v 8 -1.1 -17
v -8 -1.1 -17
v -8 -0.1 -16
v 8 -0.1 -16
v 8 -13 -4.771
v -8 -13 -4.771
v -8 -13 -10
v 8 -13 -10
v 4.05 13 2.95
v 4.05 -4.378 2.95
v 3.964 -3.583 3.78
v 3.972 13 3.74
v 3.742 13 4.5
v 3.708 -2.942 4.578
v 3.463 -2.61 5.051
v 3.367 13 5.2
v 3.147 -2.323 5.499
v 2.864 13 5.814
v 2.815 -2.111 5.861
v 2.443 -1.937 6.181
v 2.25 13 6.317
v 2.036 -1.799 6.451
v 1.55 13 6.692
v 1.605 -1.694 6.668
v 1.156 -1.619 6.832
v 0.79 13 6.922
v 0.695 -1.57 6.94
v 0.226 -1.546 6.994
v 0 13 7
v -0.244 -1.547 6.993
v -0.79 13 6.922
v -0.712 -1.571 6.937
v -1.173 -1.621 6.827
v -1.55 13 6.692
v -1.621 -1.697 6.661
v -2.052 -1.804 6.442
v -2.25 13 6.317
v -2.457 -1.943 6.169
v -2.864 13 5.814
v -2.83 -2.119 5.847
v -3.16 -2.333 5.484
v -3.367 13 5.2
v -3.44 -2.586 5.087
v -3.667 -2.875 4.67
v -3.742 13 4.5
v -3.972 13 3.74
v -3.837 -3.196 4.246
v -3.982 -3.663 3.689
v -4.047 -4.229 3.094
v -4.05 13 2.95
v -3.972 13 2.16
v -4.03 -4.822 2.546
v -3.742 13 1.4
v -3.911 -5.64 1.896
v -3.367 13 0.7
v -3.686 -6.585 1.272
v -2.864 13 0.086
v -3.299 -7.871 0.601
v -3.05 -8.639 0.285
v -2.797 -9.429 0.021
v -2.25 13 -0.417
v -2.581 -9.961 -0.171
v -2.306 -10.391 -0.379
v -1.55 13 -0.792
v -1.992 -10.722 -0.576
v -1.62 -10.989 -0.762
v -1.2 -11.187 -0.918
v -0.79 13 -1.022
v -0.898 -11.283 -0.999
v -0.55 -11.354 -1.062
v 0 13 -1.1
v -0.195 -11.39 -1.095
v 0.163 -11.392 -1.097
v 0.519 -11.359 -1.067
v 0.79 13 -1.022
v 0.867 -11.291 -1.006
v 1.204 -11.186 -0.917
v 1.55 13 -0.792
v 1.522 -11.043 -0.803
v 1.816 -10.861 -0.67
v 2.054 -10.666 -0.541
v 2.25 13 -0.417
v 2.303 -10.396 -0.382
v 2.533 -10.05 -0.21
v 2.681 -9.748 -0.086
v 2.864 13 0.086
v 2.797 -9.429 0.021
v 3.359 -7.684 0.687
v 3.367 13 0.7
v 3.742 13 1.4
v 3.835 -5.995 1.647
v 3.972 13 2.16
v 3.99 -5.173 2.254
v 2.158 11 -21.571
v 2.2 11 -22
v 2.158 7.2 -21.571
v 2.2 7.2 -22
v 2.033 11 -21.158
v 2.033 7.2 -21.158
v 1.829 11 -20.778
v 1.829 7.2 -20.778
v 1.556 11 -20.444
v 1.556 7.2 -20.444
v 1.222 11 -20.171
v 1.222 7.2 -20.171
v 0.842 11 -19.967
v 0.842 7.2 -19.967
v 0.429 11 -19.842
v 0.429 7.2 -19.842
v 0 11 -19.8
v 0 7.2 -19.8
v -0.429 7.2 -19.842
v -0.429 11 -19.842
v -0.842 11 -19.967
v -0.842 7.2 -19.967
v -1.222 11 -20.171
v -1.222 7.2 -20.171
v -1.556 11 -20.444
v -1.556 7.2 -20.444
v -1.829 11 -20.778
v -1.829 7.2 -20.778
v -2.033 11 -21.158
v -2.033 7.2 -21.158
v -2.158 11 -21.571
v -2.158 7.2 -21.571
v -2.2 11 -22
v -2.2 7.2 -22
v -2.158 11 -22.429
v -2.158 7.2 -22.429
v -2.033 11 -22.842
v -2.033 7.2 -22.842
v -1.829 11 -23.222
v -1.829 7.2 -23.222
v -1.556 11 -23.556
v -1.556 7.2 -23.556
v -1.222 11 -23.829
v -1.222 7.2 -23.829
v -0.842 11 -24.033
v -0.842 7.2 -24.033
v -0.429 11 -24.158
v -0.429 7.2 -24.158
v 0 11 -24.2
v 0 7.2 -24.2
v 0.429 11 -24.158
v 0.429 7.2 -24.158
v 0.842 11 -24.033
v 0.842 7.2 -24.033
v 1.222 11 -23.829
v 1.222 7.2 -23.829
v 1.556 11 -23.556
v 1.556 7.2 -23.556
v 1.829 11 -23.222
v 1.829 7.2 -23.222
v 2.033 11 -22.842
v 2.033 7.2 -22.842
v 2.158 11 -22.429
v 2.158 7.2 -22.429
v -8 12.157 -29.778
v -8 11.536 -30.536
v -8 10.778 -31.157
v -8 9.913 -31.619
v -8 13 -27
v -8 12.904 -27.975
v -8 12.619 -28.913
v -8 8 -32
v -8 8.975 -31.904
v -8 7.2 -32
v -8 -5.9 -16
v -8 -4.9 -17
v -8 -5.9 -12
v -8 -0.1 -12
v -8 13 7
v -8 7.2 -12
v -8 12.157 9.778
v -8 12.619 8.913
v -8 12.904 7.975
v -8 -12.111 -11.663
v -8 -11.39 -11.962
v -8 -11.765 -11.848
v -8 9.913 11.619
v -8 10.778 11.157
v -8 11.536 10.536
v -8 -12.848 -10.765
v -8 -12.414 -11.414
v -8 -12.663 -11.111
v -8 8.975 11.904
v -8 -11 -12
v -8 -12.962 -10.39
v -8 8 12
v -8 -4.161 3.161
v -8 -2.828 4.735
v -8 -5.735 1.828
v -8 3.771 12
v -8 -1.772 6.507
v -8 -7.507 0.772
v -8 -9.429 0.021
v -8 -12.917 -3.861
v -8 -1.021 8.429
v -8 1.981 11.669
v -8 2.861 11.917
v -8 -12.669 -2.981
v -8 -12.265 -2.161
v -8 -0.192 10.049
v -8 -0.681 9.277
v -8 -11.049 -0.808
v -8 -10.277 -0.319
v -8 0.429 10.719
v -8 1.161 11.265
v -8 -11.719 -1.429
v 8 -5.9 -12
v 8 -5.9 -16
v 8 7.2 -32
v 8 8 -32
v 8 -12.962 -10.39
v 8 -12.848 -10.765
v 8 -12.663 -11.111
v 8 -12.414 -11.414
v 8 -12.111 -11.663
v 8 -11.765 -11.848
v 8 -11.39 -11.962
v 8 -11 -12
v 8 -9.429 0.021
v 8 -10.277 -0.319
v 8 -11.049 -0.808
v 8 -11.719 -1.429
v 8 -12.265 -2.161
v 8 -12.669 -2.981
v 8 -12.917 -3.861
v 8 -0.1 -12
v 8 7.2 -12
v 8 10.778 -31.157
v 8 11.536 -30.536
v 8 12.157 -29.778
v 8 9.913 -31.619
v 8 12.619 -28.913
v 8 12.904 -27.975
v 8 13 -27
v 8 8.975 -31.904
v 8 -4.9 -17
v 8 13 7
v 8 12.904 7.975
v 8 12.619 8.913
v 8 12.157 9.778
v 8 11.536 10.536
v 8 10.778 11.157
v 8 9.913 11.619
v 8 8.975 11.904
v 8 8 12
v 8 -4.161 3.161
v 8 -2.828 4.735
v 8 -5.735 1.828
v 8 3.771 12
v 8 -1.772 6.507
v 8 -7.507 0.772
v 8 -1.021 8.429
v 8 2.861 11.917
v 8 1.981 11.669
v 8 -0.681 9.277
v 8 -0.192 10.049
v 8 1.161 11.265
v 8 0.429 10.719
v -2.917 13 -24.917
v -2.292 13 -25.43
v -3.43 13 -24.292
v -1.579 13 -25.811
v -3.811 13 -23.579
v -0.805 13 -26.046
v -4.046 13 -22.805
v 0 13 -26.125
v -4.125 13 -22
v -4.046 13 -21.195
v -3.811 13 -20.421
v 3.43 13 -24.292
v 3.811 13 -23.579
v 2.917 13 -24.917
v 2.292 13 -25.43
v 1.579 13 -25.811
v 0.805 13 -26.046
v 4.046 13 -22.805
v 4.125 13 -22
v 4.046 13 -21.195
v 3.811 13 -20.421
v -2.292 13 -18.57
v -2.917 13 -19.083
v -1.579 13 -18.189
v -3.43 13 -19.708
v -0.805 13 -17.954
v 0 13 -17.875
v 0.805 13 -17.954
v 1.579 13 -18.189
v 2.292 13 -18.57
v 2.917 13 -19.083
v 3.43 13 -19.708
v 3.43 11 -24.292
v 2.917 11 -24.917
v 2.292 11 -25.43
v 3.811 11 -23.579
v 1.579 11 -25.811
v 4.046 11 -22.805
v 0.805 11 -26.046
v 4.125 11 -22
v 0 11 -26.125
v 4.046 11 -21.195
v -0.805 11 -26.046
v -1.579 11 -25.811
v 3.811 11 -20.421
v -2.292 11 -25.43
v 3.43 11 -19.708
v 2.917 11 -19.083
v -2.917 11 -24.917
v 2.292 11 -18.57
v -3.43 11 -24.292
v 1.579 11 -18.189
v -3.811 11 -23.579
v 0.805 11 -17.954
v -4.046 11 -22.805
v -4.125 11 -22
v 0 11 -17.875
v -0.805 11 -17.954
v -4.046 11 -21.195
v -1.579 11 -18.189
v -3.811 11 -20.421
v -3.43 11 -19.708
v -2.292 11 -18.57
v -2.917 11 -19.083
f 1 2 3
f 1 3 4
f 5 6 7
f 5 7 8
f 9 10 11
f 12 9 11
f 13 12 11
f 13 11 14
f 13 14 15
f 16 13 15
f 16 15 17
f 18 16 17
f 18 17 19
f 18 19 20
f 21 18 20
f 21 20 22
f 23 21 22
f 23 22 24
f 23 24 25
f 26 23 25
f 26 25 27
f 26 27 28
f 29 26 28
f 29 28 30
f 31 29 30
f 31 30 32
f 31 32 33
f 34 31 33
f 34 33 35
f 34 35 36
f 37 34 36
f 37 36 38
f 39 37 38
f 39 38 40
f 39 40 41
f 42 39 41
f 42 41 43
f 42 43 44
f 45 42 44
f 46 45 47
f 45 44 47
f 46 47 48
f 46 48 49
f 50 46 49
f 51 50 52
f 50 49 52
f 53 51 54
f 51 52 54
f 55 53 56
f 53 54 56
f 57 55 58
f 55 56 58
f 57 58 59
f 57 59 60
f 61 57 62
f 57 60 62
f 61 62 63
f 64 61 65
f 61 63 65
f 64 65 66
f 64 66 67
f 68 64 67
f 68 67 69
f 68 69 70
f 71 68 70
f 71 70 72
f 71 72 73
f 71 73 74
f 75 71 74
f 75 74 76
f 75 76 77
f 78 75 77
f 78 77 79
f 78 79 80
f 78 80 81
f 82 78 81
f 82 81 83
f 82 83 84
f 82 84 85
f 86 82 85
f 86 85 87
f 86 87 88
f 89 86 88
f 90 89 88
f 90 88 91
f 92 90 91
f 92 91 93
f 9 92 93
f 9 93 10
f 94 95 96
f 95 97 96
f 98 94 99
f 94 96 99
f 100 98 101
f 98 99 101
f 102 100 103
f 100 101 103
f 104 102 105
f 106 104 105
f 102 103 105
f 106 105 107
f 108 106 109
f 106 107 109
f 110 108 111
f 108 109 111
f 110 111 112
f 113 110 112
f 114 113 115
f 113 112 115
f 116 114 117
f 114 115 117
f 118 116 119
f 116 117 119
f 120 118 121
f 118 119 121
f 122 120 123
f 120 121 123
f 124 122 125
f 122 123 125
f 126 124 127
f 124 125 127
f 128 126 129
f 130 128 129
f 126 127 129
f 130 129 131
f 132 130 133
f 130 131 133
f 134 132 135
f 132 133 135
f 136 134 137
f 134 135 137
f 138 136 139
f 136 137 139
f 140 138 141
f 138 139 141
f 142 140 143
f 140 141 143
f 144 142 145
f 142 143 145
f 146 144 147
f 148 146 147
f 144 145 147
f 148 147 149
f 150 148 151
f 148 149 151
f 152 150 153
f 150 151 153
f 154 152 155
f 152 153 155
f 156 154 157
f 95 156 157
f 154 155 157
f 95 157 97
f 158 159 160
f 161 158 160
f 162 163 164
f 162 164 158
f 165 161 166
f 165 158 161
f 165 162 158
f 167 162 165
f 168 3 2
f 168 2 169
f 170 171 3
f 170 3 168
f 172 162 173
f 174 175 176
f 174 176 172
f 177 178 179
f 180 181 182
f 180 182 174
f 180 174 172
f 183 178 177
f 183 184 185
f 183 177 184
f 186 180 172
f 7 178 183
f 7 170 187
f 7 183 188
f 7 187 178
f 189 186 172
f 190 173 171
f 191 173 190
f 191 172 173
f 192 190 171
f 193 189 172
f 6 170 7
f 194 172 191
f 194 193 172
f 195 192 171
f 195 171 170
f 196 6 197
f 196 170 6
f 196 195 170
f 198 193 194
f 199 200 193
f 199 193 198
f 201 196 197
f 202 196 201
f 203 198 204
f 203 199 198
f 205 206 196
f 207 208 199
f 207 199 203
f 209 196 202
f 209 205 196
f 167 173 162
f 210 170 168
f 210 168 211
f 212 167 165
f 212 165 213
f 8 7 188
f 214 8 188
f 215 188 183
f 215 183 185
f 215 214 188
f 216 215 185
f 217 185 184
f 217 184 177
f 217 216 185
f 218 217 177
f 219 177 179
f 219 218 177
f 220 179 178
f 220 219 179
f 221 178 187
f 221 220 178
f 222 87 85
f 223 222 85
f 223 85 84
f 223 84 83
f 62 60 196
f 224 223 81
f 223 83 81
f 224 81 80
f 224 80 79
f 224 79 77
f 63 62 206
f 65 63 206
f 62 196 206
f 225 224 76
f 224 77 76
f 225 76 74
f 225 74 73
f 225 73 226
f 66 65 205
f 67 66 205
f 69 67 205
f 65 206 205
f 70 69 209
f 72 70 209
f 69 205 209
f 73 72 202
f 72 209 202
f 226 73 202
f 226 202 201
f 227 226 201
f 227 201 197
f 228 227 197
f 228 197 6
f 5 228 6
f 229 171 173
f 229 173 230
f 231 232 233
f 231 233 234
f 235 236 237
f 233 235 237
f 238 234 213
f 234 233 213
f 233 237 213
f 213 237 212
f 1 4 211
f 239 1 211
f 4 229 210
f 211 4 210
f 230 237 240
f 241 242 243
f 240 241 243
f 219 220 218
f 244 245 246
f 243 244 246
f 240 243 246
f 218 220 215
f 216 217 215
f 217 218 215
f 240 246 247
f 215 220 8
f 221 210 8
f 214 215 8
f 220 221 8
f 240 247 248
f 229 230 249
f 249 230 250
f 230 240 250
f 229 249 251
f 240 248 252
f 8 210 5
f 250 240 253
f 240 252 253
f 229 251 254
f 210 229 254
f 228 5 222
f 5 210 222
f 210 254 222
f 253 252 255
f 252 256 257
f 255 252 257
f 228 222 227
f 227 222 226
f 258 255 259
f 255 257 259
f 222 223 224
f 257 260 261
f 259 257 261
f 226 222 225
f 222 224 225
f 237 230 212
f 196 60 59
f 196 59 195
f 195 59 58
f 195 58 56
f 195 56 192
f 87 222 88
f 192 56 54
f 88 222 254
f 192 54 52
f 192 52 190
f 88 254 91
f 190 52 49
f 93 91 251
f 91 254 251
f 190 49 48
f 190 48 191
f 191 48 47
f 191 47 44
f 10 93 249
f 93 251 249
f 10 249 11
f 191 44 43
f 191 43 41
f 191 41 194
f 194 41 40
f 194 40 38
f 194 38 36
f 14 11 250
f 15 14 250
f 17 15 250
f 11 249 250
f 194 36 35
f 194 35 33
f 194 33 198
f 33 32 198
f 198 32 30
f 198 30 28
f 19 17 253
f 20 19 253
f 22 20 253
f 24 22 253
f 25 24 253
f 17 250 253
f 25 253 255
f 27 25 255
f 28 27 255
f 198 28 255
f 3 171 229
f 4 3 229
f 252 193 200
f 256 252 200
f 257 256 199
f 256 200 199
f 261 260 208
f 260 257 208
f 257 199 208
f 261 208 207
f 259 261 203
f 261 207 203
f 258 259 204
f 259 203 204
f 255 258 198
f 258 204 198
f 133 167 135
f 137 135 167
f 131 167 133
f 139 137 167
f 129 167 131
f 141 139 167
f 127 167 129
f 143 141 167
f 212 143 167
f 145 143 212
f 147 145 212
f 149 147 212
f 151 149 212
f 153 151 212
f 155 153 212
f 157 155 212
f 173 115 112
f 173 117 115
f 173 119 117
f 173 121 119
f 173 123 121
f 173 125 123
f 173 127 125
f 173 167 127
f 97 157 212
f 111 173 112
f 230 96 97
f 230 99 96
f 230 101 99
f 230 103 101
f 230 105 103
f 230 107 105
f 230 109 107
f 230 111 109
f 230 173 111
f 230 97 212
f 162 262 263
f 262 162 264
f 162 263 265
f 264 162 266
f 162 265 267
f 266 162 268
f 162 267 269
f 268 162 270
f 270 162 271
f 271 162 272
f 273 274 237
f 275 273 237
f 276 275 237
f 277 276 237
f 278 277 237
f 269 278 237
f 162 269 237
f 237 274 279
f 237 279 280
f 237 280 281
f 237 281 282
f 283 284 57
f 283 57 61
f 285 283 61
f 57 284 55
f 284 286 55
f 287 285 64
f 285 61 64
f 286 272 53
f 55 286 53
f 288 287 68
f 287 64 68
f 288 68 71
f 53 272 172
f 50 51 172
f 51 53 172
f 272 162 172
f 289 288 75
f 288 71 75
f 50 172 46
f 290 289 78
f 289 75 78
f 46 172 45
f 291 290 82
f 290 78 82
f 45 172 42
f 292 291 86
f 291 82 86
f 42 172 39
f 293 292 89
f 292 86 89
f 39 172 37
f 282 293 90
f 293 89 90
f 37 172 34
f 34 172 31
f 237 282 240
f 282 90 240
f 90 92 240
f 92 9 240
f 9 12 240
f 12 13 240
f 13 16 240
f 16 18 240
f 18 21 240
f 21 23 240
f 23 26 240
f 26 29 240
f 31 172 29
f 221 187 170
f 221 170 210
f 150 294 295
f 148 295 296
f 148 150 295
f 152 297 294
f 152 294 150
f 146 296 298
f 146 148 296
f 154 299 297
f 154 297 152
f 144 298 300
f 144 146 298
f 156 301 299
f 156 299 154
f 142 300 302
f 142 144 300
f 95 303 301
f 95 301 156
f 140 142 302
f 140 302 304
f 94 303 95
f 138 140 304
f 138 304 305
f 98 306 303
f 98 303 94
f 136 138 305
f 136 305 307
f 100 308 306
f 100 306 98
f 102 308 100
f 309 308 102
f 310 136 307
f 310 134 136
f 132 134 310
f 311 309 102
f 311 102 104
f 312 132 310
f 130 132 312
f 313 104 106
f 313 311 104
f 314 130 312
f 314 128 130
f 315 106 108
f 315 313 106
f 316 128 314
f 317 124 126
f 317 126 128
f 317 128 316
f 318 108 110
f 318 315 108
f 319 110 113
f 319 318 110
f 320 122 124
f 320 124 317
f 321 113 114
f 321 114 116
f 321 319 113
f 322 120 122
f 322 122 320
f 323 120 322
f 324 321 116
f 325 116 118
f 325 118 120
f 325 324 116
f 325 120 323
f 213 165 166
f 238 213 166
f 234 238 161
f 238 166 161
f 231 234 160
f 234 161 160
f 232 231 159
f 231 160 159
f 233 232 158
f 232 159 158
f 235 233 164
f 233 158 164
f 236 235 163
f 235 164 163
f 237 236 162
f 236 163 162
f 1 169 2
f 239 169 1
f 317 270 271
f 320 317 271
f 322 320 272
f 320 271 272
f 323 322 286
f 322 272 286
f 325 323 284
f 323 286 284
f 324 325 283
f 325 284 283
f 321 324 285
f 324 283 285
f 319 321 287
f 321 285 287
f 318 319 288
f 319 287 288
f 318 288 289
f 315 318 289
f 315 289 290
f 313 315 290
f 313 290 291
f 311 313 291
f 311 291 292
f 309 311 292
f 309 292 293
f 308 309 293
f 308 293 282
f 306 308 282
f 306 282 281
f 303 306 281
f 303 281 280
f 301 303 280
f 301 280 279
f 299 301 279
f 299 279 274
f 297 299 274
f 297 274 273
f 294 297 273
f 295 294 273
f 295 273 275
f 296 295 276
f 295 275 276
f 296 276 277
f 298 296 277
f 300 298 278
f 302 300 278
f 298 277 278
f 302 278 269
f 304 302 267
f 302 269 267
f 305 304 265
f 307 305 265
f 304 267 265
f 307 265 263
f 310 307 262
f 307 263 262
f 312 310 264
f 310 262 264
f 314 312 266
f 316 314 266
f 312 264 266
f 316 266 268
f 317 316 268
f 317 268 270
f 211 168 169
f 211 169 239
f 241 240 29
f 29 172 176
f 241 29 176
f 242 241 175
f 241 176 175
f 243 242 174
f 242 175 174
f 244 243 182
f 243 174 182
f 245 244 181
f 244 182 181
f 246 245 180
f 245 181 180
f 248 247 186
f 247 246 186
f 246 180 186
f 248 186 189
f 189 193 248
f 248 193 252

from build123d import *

# Parameters (mm, degrees)
F0_W           = 16
F0_H           = 24
F1_DEPTH       = 13
F2_W           = 16
F2_H           = 5.8
F3_DEPTH       = 5
F4_DEPTH       = 20
F5_R           = 4.05
F6_DEPTH       = 26.001
F8_D           = 4.4
F8_CBORE_D     = 8.25
F8_CBORE_DEPTH = 2
F9_SIZE        = 1
F11_DEPTH      = 16.001
F12_T1_DEPTH   = 27.2312288127
F12_T3_DEPTH   = 27.2312288127
F12_T5_DEPTH   = 41
F12_T7_DEPTH   = 37.3525491562
F13_R          = 2


# Not quite as in the source:
# - a fillet or chamfer that OpenCascade refuses, or shapes differently, is made with other operations: its cross-section is extruded or revolved along the edge and cut away or added
# - a feature names something its author has since deleted; it is built from what else it names


with BuildPart() as f1:
    # F0 (on Front) → F1 (new body, symmetric)
    with BuildSketch(Plane.XZ):
        Rectangle(F0_W, F0_H)
    extrude(amount=F1_DEPTH, both=True)

    # F2 (on face) → F3 (join)
    with BuildSketch(Plane(origin=(0, 0, -12), x_dir=(1, 0, 0), z_dir=(0, 0, -1))):
        with Locations((0, 3)):
            Rectangle(F2_W, F2_H)
    extrude(amount=F3_DEPTH)

    # F2 (on face) → F4 (join)
    with BuildSketch(Plane(origin=(0, 0, -12), x_dir=(1, 0, 0), z_dir=(0, 0, -1))):
        with Locations((0, -10.1)):
            Rectangle(F2_W, F2_H)
    extrude(amount=F4_DEPTH)

    # F5 (on face) → F6 (cut, through all)
    with BuildSketch(Plane.XZ.offset(13)):
        with Locations((0, 2.95)):
            Circle(F5_R)
    extrude(amount=-F6_DEPTH, mode=Mode.SUBTRACT)

    # F8 (through all)
    with Locations(Plane(origin=(0, 13, 0), x_dir=(-1, 0, 0), z_dir=(0, 1, 0))):
        with Locations((0, -22)):
            CounterBoreHole(F8_D / 2, F8_CBORE_D / 2, F8_CBORE_DEPTH)

    # F9
    f9_edges = [f1.edges().sort_by_distance(p)[0] for p in [
        (0, -5.9, -17),
        (0, -0.1, -17),
    ]]
    chamfer(f9_edges, length=F9_SIZE)

    # F10 (on face) → F11 (cut, through all)
    with BuildSketch(Plane.YZ.offset(8)):
        with BuildLine():
            Line((-13, 12), (-0.5, 12))
            ThreePointArc((-0.5, 12), (-21.8388347648, 20.8388347648), (-13, -0.5))
            Line((-13, -0.5), (-13, 12))
        make_face()
        with BuildLine():
            ThreePointArc((-13, -0.5), (-4.1611652352, 3.1611652352), (-0.5, 12))
            Line((-0.5, 12), (-13, 12))
            Line((-13, 12), (-13, -0.5))
        make_face()
    extrude(amount=-F11_DEPTH, mode=Mode.SUBTRACT)

    # F12: fillet of radius 5 on 5 edges, made by hand

    # F12_s2 → F12_t1 (cut)
    with BuildSketch(Plane.YZ.offset(-8.5549542346)):
        with BuildLine():
            ThreePointArc((-9.4285714286, 0.0210644063), (-12.0089186287, -1.7824383079), (-13, -4.7705098312))
            Line((-13, -4.7705098312), (-13, -0.5))
            ThreePointArc((-13, -0.5), (-11.1953802231, -0.369047961), (-9.4285714286, 0.0210644063))
        make_face()
    extrude(amount=F12_T1_DEPTH, mode=Mode.SUBTRACT)

    # F12_s4 → F12_t3 (cut)
    with BuildSketch(Plane.YZ.offset(-18.6762745781)):
        with BuildLine():
            ThreePointArc((-9.4285714286, 0.0210644063), (-12.0089186287, -1.7824383079), (-13, -4.7705098312))
            Line((-13, -4.7705098312), (-13, -0.5))
            ThreePointArc((-13, -0.5), (-11.1953802231, -0.369047961), (-9.4285714286, 0.0210644063))
        make_face()
    extrude(amount=F12_T3_DEPTH, mode=Mode.SUBTRACT)

    # F12_s6 → F12_t5 (cut)
    with BuildSketch(Plane.YZ.offset(-20.5)):
        with BuildLine():
            ThreePointArc((8, -32), (11.5355339059, -30.5355339059), (13, -27))
            Line((13, -27), (13, -32))
            Line((13, -32), (8, -32))
        make_face()
        with BuildLine():
            ThreePointArc((13, 7), (11.5355339059, 10.5355339059), (8, 12))
            Line((8, 12), (13, 12))
            Line((13, 12), (13, 7))
        make_face()
    extrude(amount=F12_T5_DEPTH, mode=Mode.SUBTRACT)

    # F12_s8 → F12_t7 (cut)
    with BuildSketch(Plane.YZ.offset(-18.6762745781)):
        with BuildLine():
            ThreePointArc((3.7705098312, 12), (0.7824383079, 11.0089186287), (-1.0210644063, 8.4285714286))
            ThreePointArc((-1.0210644063, 8.4285714286), (-0.630952039, 10.1953802231), (-0.5, 12))
            Line((-0.5, 12), (3.7705098312, 12))
        make_face()
    extrude(amount=F12_T7_DEPTH, mode=Mode.SUBTRACT)

    # F13
    f13_edges = [f1.edges().sort_by_distance(p)[0] for p in [
        (0, -13, -12),
    ]]
    fillet(f13_edges, radius=F13_R)


solid = f1.part
